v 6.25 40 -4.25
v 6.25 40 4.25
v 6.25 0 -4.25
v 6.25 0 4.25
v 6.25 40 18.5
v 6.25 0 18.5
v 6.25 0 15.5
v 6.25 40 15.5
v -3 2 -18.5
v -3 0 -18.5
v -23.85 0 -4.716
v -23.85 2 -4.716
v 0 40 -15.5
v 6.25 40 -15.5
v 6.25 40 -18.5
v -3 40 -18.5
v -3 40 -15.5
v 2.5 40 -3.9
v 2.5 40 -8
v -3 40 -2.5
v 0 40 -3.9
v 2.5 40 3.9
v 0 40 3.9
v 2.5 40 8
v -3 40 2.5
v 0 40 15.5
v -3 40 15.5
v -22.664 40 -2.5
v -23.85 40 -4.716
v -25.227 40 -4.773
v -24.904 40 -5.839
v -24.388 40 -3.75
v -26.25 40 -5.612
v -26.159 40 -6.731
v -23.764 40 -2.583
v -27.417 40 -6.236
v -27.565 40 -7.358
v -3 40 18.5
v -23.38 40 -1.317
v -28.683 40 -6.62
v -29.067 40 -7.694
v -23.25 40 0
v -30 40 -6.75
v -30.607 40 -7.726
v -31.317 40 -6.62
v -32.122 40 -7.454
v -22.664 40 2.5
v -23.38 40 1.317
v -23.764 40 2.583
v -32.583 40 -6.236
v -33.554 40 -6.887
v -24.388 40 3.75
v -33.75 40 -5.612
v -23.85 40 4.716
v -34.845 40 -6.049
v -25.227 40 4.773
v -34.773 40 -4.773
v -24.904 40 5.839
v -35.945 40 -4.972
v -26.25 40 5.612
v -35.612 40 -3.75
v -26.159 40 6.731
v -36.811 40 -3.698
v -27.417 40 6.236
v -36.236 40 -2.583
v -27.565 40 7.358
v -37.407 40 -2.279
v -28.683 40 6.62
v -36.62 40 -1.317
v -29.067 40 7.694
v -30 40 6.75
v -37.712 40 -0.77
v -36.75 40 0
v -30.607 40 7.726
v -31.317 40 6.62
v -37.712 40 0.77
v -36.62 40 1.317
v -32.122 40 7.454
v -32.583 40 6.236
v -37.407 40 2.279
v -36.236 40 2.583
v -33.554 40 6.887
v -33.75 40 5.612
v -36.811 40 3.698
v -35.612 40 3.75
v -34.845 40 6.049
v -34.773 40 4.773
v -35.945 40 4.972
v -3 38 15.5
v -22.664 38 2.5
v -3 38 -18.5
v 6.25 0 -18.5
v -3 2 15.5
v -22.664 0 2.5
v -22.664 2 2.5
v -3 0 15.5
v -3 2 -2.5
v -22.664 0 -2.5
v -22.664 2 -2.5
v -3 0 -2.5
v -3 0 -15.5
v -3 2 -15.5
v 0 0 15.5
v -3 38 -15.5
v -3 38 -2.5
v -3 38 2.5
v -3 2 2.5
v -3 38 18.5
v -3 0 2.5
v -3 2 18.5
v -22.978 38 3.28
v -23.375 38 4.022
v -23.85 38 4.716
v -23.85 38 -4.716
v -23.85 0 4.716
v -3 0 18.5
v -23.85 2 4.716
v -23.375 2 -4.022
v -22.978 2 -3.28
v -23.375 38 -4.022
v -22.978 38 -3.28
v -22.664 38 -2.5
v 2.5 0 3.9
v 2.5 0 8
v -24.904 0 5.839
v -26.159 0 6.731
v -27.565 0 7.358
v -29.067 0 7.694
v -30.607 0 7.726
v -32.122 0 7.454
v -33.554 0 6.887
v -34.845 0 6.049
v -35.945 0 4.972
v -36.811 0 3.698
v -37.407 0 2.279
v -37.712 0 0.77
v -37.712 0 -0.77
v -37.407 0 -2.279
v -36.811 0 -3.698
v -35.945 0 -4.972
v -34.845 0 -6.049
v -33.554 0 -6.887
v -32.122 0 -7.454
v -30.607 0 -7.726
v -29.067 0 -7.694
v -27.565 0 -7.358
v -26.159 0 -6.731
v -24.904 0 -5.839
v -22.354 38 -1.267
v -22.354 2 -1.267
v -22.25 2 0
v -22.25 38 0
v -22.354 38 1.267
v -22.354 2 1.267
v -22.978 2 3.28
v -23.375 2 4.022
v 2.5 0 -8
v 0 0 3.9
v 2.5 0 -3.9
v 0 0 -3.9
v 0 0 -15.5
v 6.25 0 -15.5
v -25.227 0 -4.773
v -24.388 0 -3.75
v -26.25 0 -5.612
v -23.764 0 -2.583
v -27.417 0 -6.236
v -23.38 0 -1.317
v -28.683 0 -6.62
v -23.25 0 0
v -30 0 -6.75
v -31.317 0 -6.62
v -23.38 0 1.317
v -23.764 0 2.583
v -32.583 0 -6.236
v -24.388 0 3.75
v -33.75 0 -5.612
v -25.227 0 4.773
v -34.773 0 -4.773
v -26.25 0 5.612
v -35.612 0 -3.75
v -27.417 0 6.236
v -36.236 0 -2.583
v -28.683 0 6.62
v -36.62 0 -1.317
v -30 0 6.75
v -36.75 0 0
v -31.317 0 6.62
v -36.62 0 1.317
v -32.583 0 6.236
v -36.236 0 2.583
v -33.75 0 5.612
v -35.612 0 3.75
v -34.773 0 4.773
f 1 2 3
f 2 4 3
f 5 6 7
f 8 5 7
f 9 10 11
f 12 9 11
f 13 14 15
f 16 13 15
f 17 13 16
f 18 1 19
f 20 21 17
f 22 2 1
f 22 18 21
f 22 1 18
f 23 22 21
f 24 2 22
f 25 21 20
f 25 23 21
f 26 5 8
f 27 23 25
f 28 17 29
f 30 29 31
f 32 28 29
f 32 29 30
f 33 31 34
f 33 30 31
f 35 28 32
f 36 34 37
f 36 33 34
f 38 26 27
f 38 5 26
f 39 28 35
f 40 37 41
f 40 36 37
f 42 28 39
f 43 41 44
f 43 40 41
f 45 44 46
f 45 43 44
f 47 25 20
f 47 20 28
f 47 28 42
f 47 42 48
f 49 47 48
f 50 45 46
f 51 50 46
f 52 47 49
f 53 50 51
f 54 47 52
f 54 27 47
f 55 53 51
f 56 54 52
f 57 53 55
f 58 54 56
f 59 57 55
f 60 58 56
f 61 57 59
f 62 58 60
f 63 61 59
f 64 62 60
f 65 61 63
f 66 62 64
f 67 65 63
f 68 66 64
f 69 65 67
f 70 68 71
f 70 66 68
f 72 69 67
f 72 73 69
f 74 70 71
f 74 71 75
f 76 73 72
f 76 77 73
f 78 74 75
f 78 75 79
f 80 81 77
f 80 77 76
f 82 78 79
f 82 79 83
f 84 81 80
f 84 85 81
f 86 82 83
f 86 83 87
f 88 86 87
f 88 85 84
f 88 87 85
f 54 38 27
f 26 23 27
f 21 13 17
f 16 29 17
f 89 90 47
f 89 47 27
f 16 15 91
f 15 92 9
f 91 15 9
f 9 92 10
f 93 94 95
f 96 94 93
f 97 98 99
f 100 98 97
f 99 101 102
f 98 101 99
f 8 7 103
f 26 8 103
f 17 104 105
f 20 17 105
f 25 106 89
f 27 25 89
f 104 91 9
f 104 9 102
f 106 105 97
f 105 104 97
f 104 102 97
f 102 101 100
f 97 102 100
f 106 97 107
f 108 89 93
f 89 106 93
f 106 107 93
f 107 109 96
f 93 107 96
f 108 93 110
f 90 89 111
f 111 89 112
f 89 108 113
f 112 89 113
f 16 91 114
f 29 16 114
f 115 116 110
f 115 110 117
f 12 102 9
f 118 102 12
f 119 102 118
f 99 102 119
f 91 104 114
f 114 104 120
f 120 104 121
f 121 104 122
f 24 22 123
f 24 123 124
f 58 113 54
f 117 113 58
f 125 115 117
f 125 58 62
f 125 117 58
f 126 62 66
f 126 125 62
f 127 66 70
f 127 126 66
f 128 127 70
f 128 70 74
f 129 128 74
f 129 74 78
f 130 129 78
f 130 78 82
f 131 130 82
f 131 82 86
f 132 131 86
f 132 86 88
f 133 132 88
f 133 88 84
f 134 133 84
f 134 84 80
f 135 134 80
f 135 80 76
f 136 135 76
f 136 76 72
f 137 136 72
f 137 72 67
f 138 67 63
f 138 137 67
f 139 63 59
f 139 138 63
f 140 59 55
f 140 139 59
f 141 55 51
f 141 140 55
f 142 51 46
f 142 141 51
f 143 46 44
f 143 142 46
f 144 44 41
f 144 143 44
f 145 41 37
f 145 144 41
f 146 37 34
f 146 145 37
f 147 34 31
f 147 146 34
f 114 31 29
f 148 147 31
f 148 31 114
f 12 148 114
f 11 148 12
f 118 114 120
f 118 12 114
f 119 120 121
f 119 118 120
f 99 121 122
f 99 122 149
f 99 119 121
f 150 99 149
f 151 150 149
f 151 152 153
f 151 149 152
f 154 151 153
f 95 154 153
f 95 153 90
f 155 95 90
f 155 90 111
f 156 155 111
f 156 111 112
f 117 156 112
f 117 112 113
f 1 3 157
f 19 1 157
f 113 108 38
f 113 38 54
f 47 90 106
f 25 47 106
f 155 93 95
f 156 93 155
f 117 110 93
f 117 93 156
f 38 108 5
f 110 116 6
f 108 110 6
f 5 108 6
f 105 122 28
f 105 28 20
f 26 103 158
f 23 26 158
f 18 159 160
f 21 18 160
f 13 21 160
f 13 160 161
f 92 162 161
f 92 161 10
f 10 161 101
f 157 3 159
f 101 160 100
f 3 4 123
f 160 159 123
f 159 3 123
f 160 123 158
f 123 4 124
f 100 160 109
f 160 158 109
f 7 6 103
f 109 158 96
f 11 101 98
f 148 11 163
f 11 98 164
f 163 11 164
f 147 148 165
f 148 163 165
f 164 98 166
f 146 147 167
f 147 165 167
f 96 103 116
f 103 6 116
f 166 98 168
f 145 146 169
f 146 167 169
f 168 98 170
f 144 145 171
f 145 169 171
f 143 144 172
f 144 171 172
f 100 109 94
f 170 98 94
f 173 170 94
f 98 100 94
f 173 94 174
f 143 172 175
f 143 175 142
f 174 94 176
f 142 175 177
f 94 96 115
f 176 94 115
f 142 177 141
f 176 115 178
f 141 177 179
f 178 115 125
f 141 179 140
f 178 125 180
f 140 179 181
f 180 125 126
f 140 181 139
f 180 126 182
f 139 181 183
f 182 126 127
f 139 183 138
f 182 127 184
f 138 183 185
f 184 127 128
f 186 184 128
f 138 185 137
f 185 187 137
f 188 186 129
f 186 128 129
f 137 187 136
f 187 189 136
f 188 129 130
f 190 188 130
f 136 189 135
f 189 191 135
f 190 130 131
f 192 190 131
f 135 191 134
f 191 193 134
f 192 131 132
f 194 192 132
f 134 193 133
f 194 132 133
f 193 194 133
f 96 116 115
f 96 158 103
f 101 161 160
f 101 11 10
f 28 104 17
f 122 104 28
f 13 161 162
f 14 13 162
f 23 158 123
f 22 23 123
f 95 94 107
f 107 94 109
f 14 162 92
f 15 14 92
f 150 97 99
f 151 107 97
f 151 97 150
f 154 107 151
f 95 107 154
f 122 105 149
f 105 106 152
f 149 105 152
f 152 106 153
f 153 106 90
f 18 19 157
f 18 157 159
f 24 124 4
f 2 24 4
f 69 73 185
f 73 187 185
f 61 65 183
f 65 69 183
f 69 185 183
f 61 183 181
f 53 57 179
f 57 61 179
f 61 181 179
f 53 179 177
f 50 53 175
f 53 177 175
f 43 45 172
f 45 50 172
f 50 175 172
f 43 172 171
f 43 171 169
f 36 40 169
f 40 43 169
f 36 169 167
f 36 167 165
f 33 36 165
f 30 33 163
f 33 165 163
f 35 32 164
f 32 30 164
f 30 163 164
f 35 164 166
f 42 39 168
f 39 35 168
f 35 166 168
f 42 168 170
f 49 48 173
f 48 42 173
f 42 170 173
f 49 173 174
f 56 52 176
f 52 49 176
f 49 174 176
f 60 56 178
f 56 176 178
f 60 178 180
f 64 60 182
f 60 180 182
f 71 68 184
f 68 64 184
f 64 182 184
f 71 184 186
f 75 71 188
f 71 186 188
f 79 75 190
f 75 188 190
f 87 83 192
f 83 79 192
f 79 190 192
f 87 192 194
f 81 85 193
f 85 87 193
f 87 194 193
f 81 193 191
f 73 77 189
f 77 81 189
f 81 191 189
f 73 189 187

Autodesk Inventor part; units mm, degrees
ref_plane "YZ Plane" through (0, 0, 0) normal (1, 0, 0) x (0, 1, 0)
ref_plane "XZ Plane" through (0, 0, 0) normal (0, 1, 0) x (-1, 0, 0)
ref_plane "XY Plane" through (0, 0, 0) normal (0, 0, 1) x (1, 0, 0)
sketch "Szkic1" plane through (0, 0, 0) normal (0, 1, 0) x (-1, 0, 0)
  line L0 (3, 18.5) -> (-6.25, 18.5)
  line L1 (-6.25, 18.5) -> (-6.25, 15.5)
  line L2 (-6.25, 15.5) -> (0, 15.5)
  line L3 (0, 15.5) -> (0, -15.5)
  line L4 (0, -15.5) -> (-6.25, -15.5)
  line L5 (-6.25, -15.5) -> (-6.25, -18.5)
  line L6 (-6.25, -18.5) -> (3, -18.5)
  line L7 (3, -18.5) -> (3, 18.5)
  line L8 (3, 0) -> (0, 0) construction
  line L9 (0, 3.9) -> (-2.5, 3.9)
  line L10 (-2.5, 3.9) -> (-2.5, 8)
  line L11 (-2.5, 8) -> (-2.5, 8)
  line L12 (-2.5, 8) -> (-6.25, 4.25)
  line L13 (-6.25, 4.25) -> (-6.25, -4.25)
  line L14 (-6.25, -4.25) -> (-2.5, -8)
  line L15 (-2.5, -8) -> (-2.5, -8)
  line L16 (-2.5, -8) -> (-2.5, -3.9)
  line L17 (-2.5, -3.9) -> (0, -3.9)
  line L18 (-2.5, 3.9) -> (-2.5, -3.9) construction
  line L19 (-2.5, 0) -> (-6.25, 0) construction
  line L20 (3, 18.5) -> (3, 15.5)
  line L21 (3, -15.5) -> (3, -18.5)
  line L22 (3, -18.5) -> (3, 18.5)
  circle A0 centre (30, 0) radius 7.75
  circle A1 centre (30, 0) radius 6.75
  line L23 (3, 18.5) -> (23.8501, 4.7161)
  line L24 (22.6643, 2.5) -> (3, 15.5)
  line L25 (3, -15.5) -> (22.6643, -2.5)
  line L26 (3, -18.5) -> (23.8501, -4.7161)
  line L27 (22.6643, 2.5) -> (3, 2.5)
  line L28 (22.6643, -2.5) -> (3, -2.5)
  point P0 (0, 0)
  point P1 (1.5, -15)
  point P2 (1.5, 18)
  point P3 (1.5, 0)
  point P4 (3, 2.5)
  dimension "d1" = 7.8
  dimension "d3" = 16
  dimension "d4" = 2.5
  dimension "d6" = 3
  dimension "d7" = 3
  dimension "d11" = 8.5
  dimension "d12" = 6.25
  dimension "d26" = 31
  dimension "d42" = 13.5
  dimension "d43" = 15.5
  dimension "d44" = 30
  dimension "d45" = 5
extrude "Wyciągnięcie proste2" add sketch "Szkic1" along normal blind 40 contours L7 L6 L5 L4 L3 L2 L1 L0 | L23 A0 L24 L7 | A0 | L27 A0 L28 L7 | A0 L26 L7 L25 | L3 L17 L16 L14 L13 L12 L10 L9
extrude "Wyciągnięcie proste7" cut sketch "Szkic1" along normal blind 38 contours L23 A0 L24 L7 | L27 A0 L28 L7 | A0 L26 L7 L25
extrude "Wyciągnięcie proste8" add sketch "Szkic1" along normal blind 2 contours L23 A0 L24 L7 | L27 A0 L28 L7 | A0 L26 L7 L25
properties part number "laser-solo"
